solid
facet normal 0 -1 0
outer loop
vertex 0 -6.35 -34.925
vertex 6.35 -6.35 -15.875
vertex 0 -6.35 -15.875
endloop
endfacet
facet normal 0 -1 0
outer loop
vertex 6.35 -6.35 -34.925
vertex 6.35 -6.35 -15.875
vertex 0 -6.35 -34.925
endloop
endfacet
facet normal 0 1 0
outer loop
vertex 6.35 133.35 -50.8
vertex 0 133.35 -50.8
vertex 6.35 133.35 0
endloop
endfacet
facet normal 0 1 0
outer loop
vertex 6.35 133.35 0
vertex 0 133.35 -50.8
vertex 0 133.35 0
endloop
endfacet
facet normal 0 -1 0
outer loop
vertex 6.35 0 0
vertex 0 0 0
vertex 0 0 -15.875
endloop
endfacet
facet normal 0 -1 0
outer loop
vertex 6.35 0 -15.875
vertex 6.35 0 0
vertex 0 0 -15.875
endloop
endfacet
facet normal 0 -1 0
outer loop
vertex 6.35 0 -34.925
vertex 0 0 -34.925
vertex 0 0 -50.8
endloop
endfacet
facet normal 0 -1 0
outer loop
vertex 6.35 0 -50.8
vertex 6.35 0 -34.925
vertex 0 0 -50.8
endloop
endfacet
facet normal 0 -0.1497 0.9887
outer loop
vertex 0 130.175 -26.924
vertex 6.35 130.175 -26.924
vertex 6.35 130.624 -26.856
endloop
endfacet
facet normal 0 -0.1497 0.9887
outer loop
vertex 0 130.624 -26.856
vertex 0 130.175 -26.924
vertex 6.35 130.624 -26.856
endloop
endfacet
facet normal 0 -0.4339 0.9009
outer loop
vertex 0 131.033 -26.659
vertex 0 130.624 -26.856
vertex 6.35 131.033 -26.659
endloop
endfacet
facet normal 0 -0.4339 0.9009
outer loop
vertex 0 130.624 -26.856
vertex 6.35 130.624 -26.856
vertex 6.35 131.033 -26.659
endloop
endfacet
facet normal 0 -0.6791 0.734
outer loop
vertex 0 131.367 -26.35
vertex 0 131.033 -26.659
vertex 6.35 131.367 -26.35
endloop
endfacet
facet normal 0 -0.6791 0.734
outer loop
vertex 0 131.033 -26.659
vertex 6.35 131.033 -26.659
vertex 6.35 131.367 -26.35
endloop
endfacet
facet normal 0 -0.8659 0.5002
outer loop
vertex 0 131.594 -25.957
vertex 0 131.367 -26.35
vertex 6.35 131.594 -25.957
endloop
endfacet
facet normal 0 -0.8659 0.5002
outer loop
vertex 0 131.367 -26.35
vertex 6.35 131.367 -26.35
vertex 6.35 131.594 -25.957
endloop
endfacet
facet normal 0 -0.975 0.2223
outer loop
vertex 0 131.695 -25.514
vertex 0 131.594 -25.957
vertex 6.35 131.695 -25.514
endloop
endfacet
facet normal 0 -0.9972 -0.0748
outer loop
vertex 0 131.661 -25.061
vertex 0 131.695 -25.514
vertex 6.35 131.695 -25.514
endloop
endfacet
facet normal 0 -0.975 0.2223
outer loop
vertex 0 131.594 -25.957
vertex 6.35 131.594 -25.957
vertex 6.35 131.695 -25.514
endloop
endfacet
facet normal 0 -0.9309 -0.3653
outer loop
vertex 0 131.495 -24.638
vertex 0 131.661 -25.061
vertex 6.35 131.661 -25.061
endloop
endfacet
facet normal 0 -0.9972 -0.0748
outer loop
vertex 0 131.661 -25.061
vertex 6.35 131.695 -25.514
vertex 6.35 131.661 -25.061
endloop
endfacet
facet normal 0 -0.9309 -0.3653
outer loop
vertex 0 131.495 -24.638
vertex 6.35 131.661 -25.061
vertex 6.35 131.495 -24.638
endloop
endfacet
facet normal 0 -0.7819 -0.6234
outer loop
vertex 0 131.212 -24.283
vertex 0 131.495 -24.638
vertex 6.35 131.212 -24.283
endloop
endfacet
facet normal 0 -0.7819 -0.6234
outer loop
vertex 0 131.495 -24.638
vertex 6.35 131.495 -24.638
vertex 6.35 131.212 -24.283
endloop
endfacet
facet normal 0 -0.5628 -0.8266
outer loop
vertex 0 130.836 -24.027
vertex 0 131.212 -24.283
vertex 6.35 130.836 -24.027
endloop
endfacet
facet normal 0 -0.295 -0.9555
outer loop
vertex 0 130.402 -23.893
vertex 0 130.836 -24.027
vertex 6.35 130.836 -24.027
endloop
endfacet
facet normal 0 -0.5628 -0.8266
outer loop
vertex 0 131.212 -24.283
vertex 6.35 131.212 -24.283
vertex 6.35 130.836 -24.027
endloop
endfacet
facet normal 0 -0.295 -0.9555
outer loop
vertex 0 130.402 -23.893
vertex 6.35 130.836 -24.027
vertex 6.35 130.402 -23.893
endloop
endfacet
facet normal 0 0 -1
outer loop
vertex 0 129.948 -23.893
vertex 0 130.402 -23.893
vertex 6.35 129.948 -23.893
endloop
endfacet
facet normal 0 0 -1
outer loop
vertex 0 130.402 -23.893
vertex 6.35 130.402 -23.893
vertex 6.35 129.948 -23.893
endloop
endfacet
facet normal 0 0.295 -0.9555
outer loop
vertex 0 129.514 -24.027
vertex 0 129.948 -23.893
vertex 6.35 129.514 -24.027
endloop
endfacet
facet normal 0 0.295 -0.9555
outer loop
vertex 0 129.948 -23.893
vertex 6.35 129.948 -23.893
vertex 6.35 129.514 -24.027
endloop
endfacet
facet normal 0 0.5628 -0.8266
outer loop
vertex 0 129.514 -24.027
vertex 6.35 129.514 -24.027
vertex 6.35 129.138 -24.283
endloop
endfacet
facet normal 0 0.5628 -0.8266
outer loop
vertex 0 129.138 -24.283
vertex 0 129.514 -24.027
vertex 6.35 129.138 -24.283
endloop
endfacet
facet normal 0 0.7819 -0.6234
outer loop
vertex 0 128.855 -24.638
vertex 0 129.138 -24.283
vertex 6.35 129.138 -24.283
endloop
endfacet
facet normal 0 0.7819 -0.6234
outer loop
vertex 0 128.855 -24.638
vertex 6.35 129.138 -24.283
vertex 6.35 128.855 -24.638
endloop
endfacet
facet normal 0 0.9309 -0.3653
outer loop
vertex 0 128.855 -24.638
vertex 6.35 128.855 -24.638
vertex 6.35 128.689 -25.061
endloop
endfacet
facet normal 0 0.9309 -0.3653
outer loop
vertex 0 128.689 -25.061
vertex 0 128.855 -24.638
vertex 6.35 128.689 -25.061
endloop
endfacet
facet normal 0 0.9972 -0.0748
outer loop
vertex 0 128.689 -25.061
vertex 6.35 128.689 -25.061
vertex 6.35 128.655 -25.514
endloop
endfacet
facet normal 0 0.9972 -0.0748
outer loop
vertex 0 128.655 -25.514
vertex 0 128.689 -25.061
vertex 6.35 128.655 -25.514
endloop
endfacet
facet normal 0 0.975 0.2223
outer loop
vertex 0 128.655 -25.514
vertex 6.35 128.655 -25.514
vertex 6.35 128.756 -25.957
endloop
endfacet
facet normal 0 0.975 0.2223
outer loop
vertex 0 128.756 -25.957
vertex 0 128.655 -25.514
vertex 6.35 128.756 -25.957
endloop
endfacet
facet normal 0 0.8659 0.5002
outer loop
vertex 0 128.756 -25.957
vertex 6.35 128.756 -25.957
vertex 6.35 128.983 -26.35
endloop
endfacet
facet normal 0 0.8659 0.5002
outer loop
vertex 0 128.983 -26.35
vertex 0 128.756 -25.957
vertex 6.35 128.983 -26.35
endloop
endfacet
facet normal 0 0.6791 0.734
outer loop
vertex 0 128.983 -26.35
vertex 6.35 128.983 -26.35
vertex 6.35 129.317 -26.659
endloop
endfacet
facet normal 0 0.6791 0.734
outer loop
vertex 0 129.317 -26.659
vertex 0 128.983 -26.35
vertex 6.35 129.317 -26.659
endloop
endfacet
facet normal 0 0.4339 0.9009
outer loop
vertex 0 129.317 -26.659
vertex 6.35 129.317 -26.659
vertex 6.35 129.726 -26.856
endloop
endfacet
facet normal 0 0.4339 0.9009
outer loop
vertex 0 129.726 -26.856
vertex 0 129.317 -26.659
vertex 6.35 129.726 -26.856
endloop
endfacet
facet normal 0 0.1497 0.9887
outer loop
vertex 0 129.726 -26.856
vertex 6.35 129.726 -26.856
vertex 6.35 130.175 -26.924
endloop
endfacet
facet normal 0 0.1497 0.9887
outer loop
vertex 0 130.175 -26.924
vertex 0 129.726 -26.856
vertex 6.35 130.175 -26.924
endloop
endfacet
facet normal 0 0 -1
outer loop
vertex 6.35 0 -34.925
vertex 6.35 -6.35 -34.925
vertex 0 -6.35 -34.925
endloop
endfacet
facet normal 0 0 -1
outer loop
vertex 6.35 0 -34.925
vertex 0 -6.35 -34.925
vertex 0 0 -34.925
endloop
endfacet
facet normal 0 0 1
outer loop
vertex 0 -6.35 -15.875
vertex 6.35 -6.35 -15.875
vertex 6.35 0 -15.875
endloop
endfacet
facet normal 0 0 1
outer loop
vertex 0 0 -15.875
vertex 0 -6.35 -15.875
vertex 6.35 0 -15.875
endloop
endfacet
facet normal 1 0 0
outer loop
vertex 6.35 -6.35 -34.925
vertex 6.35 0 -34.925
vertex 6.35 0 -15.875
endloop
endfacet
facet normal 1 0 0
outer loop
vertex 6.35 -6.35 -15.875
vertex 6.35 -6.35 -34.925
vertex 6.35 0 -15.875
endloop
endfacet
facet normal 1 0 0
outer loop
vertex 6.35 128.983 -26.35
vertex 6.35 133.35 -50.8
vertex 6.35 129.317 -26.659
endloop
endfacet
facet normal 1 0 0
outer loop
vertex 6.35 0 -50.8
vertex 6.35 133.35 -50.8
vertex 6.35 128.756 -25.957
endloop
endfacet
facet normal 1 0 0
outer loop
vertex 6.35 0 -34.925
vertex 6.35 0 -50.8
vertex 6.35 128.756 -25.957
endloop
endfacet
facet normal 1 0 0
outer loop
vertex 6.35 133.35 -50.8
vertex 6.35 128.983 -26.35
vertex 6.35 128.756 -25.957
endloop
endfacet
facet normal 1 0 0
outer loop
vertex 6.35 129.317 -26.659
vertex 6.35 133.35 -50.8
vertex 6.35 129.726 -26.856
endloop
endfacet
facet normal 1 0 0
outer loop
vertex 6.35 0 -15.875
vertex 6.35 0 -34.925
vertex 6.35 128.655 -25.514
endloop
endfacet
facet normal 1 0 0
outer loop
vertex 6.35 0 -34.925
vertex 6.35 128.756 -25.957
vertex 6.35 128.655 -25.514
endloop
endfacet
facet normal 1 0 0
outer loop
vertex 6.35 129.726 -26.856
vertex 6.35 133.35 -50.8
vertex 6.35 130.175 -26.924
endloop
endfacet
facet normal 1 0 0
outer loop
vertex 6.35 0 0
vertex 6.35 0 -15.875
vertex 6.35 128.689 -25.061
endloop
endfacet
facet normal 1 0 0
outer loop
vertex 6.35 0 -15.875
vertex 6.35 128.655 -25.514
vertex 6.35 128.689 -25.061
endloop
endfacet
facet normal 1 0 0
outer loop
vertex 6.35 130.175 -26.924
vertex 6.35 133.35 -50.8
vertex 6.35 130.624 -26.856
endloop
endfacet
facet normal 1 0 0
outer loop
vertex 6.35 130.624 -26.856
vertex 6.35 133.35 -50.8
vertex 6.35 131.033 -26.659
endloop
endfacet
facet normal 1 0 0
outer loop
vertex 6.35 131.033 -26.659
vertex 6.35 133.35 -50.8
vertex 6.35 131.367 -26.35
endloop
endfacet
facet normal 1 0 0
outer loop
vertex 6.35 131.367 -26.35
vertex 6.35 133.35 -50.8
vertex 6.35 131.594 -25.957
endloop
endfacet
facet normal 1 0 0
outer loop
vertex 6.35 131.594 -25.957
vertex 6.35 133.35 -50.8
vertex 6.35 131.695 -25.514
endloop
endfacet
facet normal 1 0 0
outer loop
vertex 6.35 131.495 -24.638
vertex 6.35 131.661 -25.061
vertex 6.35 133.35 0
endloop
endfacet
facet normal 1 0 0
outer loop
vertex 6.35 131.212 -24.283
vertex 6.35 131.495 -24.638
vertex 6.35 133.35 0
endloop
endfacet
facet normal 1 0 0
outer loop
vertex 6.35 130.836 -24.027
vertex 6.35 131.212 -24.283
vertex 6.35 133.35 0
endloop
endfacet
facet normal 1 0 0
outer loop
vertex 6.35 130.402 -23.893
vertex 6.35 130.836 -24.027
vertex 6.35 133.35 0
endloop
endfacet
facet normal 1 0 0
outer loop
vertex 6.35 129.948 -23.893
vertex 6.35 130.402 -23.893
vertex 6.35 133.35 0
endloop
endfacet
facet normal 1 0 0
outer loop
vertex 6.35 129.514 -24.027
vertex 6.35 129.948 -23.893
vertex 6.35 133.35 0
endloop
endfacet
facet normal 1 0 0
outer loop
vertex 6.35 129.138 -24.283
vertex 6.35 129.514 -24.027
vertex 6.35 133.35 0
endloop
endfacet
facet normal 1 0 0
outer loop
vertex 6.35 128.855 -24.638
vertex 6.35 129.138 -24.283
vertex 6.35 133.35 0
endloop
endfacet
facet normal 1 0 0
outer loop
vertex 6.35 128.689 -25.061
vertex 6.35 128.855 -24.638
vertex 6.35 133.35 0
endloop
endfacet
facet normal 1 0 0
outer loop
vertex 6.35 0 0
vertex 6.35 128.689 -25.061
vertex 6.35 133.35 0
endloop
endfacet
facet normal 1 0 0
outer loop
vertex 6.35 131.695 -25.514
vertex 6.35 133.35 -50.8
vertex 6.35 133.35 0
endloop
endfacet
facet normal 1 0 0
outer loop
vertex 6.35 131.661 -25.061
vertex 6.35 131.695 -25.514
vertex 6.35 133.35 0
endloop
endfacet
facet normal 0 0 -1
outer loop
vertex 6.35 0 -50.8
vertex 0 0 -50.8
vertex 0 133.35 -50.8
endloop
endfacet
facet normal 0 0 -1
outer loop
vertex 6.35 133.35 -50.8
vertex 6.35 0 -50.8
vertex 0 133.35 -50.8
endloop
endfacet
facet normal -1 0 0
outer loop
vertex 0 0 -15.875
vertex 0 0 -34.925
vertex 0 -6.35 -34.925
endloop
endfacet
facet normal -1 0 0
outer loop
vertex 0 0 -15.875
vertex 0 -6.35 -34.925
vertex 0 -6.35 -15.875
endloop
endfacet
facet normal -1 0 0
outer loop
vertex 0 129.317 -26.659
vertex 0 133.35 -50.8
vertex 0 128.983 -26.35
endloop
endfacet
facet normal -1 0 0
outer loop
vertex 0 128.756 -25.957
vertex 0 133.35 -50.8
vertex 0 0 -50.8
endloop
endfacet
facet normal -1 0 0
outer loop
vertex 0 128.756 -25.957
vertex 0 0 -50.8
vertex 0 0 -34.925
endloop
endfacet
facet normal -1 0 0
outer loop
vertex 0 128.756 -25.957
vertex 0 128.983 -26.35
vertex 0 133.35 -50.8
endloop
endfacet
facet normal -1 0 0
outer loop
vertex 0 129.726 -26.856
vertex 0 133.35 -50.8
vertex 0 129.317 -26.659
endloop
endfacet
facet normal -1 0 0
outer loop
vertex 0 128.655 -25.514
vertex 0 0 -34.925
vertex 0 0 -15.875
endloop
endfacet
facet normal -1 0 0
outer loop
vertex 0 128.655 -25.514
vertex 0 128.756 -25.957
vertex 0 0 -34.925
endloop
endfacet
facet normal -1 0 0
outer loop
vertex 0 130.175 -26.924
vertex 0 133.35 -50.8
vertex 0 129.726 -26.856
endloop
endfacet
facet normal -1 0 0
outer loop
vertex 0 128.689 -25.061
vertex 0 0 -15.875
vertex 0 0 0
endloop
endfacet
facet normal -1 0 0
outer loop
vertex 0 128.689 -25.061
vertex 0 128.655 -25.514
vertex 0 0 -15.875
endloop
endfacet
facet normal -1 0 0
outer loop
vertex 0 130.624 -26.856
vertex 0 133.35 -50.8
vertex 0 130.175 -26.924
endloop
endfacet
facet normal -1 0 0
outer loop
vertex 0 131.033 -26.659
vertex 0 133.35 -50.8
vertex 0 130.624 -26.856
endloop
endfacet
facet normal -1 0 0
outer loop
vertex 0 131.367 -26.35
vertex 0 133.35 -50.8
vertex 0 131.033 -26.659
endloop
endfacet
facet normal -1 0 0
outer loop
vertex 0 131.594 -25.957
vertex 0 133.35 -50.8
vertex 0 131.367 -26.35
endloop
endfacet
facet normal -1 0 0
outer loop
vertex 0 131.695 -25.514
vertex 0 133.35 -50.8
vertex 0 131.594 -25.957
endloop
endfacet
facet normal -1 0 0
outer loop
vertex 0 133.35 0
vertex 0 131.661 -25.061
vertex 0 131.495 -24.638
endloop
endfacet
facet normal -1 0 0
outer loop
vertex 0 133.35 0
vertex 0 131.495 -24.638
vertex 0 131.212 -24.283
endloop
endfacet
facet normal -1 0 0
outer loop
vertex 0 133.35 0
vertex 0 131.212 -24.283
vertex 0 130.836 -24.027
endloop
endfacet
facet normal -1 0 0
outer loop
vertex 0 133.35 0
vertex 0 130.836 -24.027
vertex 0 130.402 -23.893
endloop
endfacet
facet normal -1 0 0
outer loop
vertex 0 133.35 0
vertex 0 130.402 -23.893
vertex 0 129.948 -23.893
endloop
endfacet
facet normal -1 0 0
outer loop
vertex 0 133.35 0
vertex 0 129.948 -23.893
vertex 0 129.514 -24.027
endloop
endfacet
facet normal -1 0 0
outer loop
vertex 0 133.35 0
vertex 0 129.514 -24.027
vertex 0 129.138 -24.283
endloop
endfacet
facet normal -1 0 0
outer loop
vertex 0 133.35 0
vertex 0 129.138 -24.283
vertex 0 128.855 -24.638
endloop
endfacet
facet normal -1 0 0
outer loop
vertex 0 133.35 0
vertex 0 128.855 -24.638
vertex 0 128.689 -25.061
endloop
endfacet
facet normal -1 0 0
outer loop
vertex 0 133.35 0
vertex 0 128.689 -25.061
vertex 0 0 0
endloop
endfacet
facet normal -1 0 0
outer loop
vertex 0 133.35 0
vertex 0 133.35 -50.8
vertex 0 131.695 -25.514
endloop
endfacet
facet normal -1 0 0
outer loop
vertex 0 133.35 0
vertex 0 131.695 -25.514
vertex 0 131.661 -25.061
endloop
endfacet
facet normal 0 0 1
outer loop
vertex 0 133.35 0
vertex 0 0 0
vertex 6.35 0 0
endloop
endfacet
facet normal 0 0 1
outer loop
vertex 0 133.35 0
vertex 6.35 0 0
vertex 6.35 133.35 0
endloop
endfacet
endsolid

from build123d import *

# Parameters (mm, degrees)
SKETCH2_W           = 50.8
SKETCH2_H           = 127
BOSS_EXTRUDE1_DEPTH = 6.35
SKETCH3_W           = 19.05
SKETCH3_H           = 6.35
BOSS_EXTRUDE2_DEPTH = 6.35
SKETCH5_W           = 50.8
SKETCH5_H           = 6.35
BOSS_EXTRUDE3_DEPTH = 6.35
SKETCH6_R           = 1.524
CUT_EXTRUDE1_DEPTH  = 143.839717866


with BuildPart() as part:
    # Sketch2 → Boss-Extrude1 (new body)
    with BuildSketch(Plane(origin=(0, 0, 0), x_dir=(0, 0, -1), z_dir=(1, 0, 0))):
        with Locations((25.4, 63.5)):
            Rectangle(SKETCH2_W, SKETCH2_H)
    extrude(amount=BOSS_EXTRUDE1_DEPTH)

    # Sketch3 → Boss-Extrude2 (add)
    with BuildSketch(Plane(origin=(6.35, 0, 0), x_dir=(0, 0, -1), z_dir=(1, 0, 0))):
        with Locations((25.4, -3.175)):
            Rectangle(SKETCH3_W, SKETCH3_H)
    extrude(amount=-BOSS_EXTRUDE2_DEPTH)

    # Sketch5 → Boss-Extrude3 (add)
    with BuildSketch(Plane.ZY):
        with Locations((-25.4, 130.175)):
            Rectangle(SKETCH5_W, SKETCH5_H)
    extrude(amount=-BOSS_EXTRUDE3_DEPTH)

    # Sketch6 → Cut-Extrude1 (cut, through all)
    with BuildSketch(Plane(origin=(6.35, 0, 0), x_dir=(0, 0, -1), z_dir=(1, 0, 0))):
        with Locations((25.4, 130.175)):
            Circle(SKETCH6_R)
    extrude(amount=-CUT_EXTRUDE1_DEPTH, mode=Mode.SUBTRACT)


solid = part.part
